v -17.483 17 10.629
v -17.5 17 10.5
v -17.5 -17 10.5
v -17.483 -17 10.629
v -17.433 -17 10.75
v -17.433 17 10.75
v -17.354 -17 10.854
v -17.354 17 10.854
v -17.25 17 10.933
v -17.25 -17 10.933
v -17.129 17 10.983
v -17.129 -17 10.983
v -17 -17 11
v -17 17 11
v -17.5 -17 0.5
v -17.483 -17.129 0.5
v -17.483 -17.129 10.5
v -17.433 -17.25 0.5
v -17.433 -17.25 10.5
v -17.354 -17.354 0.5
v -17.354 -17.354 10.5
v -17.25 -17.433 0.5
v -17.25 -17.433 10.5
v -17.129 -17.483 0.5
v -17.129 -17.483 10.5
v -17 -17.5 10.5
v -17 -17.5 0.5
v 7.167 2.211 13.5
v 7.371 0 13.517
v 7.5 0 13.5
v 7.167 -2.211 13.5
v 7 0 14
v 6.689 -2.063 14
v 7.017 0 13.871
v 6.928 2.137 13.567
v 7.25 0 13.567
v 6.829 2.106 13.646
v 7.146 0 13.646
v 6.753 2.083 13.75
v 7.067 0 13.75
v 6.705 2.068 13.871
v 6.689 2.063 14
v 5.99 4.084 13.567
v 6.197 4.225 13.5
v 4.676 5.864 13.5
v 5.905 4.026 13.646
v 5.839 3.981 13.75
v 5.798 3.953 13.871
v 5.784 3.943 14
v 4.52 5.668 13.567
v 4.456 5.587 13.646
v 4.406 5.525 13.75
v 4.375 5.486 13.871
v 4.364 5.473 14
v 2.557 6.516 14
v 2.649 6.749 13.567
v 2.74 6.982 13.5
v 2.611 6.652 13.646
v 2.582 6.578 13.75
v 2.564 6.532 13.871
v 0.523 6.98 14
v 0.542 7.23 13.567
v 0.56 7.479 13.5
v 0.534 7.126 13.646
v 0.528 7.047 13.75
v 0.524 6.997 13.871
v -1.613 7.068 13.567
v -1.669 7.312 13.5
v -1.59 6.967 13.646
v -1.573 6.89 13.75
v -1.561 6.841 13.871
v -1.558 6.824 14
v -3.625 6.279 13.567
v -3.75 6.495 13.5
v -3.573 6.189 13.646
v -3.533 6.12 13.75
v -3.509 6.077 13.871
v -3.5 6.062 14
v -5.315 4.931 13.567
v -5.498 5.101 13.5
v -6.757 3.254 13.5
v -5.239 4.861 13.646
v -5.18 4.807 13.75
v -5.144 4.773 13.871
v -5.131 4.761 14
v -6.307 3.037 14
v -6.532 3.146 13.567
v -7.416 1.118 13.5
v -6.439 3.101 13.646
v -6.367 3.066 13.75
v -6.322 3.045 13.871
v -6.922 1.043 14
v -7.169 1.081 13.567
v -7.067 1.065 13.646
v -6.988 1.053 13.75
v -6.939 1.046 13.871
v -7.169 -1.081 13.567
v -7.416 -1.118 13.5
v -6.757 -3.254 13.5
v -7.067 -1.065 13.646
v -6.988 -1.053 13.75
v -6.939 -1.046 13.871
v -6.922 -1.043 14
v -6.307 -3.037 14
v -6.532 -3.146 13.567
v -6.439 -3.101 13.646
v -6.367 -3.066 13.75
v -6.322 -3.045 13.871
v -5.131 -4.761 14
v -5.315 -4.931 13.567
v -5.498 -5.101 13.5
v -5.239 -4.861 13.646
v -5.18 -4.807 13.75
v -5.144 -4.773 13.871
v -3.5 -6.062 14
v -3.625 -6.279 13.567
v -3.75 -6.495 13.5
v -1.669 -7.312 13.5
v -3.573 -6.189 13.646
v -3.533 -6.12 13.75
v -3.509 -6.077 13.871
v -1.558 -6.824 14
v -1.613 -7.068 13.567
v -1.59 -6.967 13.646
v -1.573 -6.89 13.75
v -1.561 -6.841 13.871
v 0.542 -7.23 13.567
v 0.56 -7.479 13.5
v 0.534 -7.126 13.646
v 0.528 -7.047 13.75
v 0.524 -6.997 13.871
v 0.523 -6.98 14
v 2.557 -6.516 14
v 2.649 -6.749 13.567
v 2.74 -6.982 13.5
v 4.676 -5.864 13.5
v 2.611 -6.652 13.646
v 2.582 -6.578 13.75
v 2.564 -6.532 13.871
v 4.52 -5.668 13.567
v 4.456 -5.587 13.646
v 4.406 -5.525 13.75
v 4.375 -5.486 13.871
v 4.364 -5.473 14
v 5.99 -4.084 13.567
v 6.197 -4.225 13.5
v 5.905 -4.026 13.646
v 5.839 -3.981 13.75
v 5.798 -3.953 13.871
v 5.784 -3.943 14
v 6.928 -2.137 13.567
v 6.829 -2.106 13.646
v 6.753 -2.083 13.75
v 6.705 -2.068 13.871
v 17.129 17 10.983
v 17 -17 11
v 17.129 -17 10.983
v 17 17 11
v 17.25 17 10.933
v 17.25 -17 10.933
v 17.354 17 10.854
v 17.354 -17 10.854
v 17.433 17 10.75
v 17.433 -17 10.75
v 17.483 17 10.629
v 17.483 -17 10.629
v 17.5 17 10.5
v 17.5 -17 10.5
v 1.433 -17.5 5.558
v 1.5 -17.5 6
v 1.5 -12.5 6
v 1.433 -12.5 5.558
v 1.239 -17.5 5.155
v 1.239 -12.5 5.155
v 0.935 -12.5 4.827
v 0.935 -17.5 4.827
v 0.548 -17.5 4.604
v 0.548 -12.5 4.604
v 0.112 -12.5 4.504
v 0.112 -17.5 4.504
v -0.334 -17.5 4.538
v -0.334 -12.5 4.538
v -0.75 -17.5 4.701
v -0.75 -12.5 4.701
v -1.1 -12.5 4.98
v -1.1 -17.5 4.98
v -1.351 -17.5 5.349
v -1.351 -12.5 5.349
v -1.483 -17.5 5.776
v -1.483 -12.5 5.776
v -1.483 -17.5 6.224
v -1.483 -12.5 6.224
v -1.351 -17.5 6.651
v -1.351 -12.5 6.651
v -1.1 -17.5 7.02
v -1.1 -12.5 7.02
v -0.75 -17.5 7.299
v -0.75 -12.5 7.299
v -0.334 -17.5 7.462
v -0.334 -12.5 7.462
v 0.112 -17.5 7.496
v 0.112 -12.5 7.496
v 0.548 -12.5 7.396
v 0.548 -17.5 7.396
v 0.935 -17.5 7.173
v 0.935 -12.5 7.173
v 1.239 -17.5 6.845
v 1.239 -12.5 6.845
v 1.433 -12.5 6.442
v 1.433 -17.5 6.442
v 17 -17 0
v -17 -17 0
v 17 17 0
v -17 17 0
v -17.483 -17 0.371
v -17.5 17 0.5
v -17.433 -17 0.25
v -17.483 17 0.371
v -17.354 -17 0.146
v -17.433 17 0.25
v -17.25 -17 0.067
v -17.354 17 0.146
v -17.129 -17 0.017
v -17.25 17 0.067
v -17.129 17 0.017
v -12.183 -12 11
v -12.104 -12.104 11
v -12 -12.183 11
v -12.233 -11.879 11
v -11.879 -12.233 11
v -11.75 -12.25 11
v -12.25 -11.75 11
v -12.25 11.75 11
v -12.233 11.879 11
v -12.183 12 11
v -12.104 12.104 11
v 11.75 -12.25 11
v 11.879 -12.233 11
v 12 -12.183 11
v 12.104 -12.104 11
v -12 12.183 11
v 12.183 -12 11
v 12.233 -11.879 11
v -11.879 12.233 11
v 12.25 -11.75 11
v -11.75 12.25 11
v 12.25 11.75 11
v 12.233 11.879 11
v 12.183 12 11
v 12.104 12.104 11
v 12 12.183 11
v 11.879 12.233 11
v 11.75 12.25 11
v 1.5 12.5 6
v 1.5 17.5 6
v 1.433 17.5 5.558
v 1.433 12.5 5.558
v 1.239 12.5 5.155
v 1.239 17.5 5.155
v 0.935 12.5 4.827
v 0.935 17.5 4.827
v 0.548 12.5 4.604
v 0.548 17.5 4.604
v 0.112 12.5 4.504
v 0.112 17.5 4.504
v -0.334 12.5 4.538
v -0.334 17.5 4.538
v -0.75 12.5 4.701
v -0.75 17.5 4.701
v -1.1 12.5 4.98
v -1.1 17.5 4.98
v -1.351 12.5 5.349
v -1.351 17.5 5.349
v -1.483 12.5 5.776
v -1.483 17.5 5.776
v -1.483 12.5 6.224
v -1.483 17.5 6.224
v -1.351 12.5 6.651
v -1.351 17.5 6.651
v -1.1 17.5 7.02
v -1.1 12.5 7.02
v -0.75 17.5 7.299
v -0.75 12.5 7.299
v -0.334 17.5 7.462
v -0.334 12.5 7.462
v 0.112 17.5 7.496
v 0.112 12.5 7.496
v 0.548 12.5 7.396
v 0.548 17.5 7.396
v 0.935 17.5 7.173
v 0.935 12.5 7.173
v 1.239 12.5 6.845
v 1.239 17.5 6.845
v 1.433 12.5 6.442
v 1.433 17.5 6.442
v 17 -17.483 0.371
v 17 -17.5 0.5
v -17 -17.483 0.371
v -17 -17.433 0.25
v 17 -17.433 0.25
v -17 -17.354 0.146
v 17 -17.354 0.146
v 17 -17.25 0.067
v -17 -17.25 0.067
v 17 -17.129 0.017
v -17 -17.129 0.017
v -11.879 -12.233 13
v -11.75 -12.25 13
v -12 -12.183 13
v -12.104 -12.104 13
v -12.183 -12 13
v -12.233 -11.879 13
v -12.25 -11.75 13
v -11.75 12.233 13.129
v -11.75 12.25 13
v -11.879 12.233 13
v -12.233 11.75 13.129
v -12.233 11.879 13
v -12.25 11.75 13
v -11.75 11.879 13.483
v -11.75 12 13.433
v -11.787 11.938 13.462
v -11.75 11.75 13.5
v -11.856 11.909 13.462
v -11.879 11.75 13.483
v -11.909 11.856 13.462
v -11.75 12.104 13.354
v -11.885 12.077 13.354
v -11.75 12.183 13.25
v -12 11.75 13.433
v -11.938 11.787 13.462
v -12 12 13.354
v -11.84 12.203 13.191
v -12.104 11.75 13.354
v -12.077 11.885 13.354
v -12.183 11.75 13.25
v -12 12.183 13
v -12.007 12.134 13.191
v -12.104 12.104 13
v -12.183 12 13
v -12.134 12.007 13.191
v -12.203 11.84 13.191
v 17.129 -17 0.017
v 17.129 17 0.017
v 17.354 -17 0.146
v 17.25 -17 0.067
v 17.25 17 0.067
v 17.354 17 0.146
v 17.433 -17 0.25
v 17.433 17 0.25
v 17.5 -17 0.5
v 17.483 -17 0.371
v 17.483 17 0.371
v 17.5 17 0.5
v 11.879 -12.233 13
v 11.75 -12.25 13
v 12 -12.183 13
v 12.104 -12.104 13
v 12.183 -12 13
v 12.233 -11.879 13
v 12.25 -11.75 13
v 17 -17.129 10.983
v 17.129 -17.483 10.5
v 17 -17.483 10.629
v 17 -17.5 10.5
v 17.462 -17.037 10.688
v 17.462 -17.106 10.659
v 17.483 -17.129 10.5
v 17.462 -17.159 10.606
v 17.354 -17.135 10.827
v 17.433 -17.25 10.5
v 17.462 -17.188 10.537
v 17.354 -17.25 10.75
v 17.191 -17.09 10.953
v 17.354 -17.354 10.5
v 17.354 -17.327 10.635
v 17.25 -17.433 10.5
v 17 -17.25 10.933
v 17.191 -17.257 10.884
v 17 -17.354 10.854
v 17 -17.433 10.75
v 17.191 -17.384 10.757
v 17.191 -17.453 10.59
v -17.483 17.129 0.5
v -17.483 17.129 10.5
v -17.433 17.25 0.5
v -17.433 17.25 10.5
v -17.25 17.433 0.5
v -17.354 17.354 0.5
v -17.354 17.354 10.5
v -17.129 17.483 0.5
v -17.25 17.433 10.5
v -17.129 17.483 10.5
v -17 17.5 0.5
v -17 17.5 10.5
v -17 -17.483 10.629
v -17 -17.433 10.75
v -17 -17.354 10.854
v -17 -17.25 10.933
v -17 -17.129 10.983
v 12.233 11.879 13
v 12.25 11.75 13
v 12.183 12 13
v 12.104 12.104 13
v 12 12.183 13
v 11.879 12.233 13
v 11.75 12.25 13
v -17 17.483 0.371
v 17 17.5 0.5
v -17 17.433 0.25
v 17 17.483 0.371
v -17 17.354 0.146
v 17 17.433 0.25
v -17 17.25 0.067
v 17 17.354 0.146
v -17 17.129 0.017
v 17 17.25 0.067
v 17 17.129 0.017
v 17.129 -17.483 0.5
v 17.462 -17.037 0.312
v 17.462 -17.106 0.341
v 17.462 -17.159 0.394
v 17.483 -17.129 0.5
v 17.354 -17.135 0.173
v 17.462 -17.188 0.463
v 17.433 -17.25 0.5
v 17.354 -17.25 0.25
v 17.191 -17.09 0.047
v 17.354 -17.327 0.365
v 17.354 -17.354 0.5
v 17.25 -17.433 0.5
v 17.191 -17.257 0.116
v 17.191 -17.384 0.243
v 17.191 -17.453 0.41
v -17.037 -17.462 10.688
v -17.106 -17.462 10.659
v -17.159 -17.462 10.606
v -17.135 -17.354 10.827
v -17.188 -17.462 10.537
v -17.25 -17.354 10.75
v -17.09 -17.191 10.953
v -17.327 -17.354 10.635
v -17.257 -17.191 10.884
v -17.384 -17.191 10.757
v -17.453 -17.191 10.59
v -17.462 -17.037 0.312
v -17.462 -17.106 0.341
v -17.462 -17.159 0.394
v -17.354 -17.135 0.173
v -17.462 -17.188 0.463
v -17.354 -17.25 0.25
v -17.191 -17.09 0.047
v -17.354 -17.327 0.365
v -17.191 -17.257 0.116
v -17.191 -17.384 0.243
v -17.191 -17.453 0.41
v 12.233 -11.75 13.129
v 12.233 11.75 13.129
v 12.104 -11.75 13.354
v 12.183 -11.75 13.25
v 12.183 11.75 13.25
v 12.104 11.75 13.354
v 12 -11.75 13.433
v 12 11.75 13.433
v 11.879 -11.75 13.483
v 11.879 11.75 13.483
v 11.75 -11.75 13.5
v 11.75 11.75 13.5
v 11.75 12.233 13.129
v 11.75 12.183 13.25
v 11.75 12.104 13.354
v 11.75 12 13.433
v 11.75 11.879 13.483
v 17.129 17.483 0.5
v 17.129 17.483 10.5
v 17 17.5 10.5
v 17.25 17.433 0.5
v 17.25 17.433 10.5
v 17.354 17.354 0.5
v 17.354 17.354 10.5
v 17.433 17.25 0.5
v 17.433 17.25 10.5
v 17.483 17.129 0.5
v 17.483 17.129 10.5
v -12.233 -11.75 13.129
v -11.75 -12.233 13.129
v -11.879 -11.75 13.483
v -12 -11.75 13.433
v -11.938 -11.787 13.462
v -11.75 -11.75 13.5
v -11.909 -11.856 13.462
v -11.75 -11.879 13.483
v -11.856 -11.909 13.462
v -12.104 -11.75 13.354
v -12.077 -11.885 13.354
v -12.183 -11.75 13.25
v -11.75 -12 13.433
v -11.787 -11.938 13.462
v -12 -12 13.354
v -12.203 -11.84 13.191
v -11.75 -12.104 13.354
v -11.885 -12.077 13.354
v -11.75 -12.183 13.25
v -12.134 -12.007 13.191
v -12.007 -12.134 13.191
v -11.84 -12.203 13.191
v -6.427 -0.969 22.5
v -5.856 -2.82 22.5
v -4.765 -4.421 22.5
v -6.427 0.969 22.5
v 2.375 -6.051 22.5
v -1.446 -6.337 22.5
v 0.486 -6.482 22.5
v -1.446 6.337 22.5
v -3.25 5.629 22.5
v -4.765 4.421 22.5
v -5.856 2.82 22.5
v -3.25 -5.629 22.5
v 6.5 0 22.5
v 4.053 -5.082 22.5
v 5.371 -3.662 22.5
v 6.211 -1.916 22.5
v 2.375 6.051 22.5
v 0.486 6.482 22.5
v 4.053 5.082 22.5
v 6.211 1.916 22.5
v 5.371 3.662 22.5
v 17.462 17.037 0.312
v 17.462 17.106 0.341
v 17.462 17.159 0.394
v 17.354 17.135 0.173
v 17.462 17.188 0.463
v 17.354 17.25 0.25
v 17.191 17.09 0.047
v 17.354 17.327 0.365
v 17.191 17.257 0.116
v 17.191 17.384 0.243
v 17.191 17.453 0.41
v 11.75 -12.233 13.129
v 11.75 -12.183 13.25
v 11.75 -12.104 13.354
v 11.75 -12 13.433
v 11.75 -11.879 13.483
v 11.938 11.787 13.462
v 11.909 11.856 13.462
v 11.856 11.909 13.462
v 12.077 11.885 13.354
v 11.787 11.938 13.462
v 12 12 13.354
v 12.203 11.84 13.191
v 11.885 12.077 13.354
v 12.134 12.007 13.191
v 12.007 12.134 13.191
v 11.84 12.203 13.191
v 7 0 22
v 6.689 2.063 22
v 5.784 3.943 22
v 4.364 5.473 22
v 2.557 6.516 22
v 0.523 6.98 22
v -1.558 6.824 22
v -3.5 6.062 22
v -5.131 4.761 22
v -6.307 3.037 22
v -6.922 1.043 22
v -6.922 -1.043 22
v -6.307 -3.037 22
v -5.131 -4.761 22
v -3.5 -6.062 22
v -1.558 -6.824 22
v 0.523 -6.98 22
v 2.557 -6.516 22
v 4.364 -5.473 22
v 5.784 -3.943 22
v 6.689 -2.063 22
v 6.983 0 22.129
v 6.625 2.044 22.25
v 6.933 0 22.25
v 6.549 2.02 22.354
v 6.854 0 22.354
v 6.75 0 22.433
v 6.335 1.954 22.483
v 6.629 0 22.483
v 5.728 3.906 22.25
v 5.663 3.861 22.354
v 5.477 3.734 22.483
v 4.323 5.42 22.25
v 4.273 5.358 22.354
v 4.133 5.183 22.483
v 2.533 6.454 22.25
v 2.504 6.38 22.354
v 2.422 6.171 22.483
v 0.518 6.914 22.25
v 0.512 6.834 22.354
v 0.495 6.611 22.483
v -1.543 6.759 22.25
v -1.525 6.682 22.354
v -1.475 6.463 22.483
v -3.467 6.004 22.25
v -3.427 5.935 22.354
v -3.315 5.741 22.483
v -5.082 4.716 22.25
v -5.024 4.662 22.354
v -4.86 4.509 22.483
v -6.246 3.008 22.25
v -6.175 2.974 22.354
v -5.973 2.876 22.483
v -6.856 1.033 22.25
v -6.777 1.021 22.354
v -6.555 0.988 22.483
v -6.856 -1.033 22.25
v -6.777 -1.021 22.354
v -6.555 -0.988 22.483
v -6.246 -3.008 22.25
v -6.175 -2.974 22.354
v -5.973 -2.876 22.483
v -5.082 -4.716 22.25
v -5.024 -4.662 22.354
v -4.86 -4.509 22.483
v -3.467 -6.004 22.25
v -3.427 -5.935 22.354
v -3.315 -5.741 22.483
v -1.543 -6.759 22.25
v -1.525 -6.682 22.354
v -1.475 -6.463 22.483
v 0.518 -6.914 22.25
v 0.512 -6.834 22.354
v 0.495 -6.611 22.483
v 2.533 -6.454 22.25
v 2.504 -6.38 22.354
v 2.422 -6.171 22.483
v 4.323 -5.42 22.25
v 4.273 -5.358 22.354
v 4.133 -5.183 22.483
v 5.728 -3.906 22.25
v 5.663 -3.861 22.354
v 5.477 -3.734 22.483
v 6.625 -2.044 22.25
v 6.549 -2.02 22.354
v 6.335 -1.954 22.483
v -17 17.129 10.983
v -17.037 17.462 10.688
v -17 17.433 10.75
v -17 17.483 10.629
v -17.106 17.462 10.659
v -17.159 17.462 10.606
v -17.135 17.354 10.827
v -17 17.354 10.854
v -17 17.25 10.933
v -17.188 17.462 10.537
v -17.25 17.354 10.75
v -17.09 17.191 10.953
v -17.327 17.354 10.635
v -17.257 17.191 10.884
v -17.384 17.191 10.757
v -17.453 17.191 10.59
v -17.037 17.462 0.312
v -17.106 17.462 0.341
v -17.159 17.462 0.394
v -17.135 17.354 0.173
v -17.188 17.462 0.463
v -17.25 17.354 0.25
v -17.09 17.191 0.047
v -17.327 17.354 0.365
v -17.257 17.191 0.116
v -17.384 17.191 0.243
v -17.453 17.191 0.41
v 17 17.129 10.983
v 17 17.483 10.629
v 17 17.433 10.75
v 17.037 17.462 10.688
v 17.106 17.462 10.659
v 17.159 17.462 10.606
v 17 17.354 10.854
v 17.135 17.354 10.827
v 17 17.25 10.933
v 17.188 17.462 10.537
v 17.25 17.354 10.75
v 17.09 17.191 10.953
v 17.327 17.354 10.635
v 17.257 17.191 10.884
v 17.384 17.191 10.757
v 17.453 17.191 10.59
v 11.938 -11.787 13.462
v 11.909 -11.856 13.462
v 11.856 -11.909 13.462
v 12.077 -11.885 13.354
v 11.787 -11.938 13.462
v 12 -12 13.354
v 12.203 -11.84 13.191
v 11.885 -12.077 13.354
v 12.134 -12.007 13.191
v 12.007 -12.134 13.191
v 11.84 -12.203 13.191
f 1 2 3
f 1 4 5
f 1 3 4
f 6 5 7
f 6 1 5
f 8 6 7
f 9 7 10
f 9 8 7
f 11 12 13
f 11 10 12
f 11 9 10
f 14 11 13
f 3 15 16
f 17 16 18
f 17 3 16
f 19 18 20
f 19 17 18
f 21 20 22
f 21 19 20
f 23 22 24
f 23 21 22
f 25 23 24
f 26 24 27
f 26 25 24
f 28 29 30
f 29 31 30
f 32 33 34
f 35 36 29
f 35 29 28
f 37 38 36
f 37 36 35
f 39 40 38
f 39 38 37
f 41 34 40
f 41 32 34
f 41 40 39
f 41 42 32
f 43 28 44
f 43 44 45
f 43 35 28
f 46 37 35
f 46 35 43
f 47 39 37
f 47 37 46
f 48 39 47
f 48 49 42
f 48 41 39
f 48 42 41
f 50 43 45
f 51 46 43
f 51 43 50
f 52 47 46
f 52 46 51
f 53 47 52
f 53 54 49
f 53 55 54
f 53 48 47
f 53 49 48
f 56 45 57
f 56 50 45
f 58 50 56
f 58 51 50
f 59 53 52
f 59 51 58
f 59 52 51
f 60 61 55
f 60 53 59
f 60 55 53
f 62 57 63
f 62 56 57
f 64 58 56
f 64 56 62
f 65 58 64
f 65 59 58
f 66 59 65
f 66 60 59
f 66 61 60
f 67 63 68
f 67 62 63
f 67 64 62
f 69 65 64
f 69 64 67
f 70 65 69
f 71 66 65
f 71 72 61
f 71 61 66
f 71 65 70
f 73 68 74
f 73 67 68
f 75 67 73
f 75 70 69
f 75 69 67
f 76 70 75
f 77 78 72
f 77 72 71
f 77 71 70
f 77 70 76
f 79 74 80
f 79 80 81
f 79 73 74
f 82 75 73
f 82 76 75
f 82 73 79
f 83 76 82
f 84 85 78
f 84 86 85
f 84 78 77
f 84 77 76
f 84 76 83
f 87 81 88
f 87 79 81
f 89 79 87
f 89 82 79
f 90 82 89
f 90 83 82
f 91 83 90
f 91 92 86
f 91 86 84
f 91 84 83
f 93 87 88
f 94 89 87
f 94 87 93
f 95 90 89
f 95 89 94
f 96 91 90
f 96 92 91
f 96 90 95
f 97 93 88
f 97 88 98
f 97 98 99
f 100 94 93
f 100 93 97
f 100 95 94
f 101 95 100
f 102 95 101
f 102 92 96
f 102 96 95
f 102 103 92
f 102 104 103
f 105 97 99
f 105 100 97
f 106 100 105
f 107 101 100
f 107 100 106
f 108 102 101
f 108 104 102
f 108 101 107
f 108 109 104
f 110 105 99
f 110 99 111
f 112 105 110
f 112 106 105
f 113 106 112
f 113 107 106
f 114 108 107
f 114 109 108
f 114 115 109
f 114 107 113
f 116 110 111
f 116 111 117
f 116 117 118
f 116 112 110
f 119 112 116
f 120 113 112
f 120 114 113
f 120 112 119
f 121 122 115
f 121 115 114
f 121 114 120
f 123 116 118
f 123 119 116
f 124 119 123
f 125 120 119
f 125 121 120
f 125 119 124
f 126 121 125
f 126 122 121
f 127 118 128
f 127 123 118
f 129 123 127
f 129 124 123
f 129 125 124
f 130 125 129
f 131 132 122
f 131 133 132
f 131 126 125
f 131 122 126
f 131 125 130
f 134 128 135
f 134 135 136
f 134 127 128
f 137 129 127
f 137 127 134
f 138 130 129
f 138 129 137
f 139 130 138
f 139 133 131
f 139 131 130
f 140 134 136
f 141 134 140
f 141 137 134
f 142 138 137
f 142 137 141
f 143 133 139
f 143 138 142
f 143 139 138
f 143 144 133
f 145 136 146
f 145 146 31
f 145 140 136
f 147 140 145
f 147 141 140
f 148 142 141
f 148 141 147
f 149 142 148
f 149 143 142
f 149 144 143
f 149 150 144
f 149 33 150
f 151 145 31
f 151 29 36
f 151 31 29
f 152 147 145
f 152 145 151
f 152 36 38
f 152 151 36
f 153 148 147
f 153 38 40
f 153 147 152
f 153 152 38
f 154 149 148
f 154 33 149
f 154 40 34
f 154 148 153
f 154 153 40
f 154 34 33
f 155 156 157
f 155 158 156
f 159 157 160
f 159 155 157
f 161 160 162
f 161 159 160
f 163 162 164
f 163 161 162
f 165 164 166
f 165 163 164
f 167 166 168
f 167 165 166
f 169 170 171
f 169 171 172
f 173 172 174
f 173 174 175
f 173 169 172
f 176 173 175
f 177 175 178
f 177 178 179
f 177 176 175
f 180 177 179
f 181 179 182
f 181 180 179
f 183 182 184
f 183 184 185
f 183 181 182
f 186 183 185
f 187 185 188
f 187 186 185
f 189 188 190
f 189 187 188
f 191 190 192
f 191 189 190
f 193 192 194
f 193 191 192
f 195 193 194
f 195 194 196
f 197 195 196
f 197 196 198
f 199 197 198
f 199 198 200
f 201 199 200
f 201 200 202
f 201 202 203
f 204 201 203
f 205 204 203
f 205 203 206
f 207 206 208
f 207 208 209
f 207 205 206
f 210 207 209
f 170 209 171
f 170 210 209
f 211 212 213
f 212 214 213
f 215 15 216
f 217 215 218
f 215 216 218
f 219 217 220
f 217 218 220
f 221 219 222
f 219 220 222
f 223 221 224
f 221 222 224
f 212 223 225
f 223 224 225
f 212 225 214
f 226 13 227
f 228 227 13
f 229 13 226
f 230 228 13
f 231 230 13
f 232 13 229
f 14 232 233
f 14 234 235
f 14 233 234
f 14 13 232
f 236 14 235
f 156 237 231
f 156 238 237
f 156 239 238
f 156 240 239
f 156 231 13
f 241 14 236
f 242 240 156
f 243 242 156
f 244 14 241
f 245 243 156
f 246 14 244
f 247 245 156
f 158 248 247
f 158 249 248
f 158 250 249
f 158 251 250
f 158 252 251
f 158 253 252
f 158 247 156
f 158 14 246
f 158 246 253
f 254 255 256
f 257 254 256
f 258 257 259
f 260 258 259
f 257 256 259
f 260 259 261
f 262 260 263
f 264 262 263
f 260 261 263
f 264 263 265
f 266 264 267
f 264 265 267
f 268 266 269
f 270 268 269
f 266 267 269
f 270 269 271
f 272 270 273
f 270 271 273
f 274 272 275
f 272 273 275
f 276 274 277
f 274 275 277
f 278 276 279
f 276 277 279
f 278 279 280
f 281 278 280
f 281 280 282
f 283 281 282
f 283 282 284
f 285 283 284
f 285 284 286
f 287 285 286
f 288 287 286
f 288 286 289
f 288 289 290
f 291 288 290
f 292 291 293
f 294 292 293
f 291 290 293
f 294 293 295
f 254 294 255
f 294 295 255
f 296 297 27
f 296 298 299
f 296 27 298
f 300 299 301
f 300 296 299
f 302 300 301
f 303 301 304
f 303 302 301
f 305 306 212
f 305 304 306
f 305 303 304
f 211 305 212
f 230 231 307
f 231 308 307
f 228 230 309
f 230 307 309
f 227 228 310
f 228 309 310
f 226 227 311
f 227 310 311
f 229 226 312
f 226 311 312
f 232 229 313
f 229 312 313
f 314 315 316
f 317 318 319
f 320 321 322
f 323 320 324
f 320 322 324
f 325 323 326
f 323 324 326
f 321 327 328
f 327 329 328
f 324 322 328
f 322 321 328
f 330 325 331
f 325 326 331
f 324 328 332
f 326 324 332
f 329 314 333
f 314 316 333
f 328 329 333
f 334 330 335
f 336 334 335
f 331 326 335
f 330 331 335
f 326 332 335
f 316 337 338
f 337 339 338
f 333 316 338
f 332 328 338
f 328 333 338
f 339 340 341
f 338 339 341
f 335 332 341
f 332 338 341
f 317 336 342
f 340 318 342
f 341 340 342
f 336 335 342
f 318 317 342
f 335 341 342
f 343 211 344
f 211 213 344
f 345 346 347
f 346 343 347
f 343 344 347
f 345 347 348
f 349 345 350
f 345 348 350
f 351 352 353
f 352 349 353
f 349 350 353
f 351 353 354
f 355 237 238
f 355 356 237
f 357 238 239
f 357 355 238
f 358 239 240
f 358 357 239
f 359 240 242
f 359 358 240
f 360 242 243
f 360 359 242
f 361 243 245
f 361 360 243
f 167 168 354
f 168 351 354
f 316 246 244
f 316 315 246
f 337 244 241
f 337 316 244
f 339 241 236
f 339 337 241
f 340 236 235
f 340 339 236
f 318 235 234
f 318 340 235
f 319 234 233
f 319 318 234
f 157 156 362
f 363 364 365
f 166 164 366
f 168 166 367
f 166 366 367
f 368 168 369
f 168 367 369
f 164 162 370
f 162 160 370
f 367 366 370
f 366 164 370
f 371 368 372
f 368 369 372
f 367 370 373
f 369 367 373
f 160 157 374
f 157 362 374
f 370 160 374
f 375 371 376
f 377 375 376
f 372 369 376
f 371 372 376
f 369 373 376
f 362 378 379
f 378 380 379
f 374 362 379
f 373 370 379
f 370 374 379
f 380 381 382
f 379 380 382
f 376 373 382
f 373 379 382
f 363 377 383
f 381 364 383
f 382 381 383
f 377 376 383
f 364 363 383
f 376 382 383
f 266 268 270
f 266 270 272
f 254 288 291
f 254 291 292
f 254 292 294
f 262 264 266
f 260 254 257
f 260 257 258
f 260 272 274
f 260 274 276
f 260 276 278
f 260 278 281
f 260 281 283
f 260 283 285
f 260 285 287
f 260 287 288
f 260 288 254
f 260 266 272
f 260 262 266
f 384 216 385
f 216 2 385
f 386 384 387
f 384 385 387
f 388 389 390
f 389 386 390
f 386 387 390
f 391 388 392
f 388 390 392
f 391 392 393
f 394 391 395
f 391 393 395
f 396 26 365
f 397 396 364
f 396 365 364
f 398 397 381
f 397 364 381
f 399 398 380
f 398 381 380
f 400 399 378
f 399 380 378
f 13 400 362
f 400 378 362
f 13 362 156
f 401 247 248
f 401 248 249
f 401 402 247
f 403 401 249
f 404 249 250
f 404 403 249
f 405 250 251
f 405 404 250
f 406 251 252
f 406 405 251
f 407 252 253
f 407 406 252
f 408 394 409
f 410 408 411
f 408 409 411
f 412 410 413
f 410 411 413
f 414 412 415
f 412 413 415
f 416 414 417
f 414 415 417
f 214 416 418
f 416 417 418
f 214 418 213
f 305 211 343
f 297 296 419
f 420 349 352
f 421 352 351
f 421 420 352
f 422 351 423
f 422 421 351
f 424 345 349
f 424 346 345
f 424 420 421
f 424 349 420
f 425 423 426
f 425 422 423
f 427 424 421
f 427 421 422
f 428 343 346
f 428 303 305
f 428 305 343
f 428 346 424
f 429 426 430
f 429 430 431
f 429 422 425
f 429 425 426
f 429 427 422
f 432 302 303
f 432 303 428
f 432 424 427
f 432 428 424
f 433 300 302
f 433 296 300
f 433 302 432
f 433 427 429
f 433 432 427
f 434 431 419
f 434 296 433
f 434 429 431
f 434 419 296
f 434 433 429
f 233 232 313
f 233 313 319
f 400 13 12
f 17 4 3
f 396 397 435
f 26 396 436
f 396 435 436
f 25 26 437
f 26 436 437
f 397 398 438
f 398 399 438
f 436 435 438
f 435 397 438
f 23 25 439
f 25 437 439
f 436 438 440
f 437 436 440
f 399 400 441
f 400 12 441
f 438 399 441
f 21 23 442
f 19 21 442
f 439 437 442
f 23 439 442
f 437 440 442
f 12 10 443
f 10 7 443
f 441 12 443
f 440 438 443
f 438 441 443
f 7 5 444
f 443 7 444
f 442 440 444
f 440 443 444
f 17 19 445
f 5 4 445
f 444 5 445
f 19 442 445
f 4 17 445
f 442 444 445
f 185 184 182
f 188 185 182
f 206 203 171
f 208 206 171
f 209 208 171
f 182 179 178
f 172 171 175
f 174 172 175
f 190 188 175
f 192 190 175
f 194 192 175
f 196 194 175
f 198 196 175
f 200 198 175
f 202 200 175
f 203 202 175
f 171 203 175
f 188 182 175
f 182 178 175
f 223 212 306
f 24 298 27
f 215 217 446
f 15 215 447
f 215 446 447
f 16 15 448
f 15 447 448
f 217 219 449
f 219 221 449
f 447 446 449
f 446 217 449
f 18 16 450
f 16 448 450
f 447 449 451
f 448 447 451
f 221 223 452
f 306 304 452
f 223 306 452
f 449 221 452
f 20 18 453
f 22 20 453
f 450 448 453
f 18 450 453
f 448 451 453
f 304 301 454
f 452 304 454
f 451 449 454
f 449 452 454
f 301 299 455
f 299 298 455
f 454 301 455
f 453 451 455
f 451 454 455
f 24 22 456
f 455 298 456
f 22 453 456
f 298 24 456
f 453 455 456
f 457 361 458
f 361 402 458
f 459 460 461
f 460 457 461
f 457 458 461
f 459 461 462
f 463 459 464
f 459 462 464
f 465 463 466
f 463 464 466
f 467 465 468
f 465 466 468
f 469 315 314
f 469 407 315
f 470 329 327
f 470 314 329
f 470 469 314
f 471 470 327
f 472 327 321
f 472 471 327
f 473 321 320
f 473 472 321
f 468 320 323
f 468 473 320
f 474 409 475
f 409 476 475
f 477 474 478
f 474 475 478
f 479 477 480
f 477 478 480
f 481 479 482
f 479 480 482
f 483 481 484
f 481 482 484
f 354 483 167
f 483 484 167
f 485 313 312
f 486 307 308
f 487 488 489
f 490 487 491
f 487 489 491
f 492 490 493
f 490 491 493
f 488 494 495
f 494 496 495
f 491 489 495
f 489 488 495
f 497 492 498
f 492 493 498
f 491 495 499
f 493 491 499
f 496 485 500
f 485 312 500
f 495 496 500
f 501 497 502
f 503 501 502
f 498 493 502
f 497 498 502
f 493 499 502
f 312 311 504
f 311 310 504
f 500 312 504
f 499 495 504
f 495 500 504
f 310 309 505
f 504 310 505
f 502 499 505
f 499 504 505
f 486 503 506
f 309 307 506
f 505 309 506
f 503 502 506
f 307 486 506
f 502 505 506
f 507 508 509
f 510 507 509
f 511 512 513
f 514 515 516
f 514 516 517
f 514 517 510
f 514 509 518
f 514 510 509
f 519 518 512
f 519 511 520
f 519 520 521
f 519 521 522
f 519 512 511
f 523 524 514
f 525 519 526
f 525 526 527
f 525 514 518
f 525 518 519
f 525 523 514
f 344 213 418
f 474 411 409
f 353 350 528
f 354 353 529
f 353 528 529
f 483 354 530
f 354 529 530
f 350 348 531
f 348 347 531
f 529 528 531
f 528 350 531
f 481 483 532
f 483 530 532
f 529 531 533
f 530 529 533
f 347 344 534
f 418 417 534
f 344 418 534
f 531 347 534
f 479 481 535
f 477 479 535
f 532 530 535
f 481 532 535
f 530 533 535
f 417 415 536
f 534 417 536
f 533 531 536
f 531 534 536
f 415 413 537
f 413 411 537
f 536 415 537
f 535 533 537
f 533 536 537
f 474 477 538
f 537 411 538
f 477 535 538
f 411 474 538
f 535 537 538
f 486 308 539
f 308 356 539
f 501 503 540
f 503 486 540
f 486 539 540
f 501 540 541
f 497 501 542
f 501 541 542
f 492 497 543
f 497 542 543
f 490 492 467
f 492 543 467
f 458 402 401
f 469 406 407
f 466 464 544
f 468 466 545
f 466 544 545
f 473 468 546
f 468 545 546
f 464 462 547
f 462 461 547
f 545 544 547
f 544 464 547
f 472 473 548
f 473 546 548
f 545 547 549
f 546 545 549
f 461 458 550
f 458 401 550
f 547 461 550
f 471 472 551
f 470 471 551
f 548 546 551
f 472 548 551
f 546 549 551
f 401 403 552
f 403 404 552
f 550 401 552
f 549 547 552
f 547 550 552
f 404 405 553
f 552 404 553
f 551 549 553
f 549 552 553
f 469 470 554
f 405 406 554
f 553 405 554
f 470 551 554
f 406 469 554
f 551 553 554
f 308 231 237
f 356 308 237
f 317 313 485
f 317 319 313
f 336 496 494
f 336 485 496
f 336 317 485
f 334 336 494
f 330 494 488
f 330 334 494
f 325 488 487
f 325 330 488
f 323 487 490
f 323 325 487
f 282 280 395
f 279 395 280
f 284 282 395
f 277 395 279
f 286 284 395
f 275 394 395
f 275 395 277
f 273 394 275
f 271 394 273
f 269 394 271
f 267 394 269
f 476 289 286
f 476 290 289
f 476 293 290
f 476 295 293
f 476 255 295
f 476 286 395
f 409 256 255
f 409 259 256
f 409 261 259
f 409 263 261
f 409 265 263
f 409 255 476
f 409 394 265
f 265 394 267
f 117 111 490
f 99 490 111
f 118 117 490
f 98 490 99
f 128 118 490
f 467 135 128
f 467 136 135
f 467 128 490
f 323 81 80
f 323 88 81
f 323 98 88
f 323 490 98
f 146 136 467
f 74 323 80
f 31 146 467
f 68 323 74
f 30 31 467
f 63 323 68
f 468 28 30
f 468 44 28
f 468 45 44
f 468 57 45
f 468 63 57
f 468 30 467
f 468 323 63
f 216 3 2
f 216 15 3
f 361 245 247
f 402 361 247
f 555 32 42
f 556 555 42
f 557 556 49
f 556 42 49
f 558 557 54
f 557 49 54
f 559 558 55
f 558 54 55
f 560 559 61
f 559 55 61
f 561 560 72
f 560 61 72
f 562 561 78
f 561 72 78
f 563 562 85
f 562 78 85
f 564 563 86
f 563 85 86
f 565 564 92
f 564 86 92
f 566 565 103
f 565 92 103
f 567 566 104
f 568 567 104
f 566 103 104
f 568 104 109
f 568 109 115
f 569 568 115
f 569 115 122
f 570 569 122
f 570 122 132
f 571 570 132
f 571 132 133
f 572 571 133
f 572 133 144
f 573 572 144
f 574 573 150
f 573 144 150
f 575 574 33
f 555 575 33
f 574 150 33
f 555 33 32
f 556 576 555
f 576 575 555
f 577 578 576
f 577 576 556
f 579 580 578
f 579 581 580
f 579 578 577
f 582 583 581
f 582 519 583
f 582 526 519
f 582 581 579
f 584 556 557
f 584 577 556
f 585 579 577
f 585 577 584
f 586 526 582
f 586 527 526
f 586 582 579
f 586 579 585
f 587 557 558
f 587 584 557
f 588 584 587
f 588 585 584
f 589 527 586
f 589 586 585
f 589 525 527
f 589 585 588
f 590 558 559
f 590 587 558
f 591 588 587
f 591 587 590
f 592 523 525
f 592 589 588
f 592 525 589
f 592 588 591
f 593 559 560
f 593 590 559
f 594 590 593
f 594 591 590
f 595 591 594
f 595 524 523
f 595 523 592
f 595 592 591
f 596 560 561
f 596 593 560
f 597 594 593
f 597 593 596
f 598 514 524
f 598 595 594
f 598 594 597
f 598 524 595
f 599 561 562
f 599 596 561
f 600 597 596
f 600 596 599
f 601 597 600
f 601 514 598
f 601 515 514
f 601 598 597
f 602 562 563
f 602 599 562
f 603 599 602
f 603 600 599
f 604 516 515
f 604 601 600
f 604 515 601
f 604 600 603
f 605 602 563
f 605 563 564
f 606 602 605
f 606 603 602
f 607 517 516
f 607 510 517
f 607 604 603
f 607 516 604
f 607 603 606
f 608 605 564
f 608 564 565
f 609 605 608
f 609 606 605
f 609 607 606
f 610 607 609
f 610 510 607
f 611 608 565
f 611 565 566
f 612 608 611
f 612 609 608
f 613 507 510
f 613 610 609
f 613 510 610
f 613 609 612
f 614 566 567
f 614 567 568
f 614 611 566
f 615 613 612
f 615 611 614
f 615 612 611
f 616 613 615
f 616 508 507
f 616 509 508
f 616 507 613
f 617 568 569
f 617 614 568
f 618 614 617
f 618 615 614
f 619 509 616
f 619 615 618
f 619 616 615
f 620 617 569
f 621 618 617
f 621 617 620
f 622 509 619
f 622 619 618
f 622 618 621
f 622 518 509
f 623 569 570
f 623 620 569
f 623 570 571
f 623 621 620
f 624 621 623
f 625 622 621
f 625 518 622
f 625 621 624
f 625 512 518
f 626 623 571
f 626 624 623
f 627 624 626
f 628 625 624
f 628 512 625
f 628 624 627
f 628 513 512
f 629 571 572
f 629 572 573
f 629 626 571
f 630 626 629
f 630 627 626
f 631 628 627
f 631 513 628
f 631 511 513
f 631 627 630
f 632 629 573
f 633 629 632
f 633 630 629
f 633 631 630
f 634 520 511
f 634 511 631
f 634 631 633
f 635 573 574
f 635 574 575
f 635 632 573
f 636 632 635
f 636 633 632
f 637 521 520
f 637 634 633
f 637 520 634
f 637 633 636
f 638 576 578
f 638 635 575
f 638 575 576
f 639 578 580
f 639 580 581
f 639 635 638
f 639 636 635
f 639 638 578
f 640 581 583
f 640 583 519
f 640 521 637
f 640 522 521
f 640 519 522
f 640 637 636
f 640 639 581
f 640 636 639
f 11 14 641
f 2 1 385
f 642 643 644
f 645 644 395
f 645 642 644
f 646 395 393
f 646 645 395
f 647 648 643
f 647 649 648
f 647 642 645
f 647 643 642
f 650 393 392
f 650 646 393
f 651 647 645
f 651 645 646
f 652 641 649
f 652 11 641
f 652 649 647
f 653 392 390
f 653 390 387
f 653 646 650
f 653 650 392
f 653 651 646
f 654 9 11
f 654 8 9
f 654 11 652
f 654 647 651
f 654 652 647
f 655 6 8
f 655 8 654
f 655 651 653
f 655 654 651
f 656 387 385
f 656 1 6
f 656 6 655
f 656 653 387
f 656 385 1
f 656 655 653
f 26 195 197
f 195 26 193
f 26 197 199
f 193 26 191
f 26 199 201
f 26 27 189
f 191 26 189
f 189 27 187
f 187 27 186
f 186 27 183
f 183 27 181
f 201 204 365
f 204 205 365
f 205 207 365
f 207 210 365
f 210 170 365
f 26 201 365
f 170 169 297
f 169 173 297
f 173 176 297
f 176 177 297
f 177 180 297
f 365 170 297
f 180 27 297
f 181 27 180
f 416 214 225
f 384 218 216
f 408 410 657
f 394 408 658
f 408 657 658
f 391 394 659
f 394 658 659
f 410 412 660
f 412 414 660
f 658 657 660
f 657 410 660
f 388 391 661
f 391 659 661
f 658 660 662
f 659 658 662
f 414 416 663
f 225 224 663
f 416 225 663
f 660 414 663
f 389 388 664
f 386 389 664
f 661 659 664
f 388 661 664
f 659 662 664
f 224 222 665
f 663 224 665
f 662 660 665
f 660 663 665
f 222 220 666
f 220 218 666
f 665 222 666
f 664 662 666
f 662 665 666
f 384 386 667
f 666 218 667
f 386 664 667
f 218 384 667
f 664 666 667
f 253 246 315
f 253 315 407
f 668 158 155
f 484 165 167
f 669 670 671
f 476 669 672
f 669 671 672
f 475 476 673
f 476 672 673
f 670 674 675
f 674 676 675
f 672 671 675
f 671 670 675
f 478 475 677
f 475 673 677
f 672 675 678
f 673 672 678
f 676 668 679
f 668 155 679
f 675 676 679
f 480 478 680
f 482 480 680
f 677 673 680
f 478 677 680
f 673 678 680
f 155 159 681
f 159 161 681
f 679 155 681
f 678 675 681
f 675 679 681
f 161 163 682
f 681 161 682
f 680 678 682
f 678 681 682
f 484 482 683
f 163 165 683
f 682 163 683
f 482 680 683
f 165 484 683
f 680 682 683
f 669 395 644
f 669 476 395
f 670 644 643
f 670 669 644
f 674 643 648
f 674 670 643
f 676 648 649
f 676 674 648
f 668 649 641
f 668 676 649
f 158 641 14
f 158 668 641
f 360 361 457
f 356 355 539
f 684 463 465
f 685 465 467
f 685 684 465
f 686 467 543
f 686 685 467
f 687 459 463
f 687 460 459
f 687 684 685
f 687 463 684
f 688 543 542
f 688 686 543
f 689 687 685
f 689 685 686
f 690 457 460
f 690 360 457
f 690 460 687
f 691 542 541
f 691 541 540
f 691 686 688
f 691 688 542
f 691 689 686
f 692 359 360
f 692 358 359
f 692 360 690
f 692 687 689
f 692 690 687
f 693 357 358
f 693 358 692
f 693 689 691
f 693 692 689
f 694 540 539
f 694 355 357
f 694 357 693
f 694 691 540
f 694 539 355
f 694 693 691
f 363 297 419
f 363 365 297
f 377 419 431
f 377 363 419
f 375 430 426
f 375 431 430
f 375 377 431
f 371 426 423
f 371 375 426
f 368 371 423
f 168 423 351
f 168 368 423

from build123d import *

# Parameters (mm, degrees)
SKETCH1_W           = 35
SKETCH1_H           = 35
BOSS_EXTRUDE1_DEPTH = 11
SKETCH2_R           = 1.5
CUT_EXTRUDE1_DEPTH  = 5
SKETCH3_W           = 24.5
SKETCH3_H           = 24.5
BOSS_EXTRUDE2_DEPTH = 2.5
SKETCH4_R           = 7
BOSS_EXTRUDE3_DEPTH = 9
FILLET1_R           = 0.5
FILLET2_R           = 0.5


with BuildPart() as part:
    # Sketch1 → Boss-Extrude1 (new body)
    with BuildSketch(Plane.XY):
        Rectangle(SKETCH1_W, SKETCH1_H)
    extrude(amount=BOSS_EXTRUDE1_DEPTH)

    # Sketch2 → Cut-Extrude1 (cut)
    with BuildSketch(Plane(origin=(0, 17.5, 0), x_dir=(1, 0, 0), z_dir=(0, 1, 0))):
        with Locations((0, -6)):
            Circle(SKETCH2_R)
    cut_extrude1 = extrude(amount=-CUT_EXTRUDE1_DEPTH, mode=Mode.SUBTRACT)

    # Mirror1: Cut-Extrude1 across plane
    add(cut_extrude1.mirror(Plane.ZX), mode=Mode.SUBTRACT)

    # Sketch3 → Boss-Extrude2 (add)
    with BuildSketch(Plane.XY.offset(11)):
        Rectangle(SKETCH3_W, SKETCH3_H)
    extrude(amount=BOSS_EXTRUDE2_DEPTH)

    # Sketch4 → Boss-Extrude3 (add)
    with BuildSketch(Plane.XY.offset(13.5)):
        Circle(SKETCH4_R)
    extrude(amount=BOSS_EXTRUDE3_DEPTH)

    # Fillet1
    fillet1_edges = [part.edges().sort_by_distance(p)[0] for p in [
        (-17.5, 0, 11),
        (0, -17.5, 11),
        (12.25, -12.25, 12.25),
        (12.25, 12.25, 12.25),
        (-12.25, 12.25, 12.25),
        (-12.25, -12.25, 12.25),
        (12.25, 0, 13.5),
        (0, 12.25, 13.5),
        (-12.25, 0, 13.5),
        (0, -12.25, 13.5),
        (-7, 0, 13.5),
        (17.5, 0, 11),
        (0, -17.5, 0),
        (-17.5, 0, 0),
        (0, 17.5, 0),
        (17.5, 0, 0),
        (0, 17.5, 11),
        (17.5, -17.5, 5.5),
        (-17.5, -17.5, 5.5),
        (-17.5, 17.5, 5.5),
        (17.5, 17.5, 5.5),
    ]]
    fillet(fillet1_edges, radius=FILLET1_R)

    # Fillet2
    fillet2_edges = [part.edges().sort_by_distance(p)[0] for p in [
        (-7, 0, 22.5),
    ]]
    fillet(fillet2_edges, radius=FILLET2_R)


solid = part.part
